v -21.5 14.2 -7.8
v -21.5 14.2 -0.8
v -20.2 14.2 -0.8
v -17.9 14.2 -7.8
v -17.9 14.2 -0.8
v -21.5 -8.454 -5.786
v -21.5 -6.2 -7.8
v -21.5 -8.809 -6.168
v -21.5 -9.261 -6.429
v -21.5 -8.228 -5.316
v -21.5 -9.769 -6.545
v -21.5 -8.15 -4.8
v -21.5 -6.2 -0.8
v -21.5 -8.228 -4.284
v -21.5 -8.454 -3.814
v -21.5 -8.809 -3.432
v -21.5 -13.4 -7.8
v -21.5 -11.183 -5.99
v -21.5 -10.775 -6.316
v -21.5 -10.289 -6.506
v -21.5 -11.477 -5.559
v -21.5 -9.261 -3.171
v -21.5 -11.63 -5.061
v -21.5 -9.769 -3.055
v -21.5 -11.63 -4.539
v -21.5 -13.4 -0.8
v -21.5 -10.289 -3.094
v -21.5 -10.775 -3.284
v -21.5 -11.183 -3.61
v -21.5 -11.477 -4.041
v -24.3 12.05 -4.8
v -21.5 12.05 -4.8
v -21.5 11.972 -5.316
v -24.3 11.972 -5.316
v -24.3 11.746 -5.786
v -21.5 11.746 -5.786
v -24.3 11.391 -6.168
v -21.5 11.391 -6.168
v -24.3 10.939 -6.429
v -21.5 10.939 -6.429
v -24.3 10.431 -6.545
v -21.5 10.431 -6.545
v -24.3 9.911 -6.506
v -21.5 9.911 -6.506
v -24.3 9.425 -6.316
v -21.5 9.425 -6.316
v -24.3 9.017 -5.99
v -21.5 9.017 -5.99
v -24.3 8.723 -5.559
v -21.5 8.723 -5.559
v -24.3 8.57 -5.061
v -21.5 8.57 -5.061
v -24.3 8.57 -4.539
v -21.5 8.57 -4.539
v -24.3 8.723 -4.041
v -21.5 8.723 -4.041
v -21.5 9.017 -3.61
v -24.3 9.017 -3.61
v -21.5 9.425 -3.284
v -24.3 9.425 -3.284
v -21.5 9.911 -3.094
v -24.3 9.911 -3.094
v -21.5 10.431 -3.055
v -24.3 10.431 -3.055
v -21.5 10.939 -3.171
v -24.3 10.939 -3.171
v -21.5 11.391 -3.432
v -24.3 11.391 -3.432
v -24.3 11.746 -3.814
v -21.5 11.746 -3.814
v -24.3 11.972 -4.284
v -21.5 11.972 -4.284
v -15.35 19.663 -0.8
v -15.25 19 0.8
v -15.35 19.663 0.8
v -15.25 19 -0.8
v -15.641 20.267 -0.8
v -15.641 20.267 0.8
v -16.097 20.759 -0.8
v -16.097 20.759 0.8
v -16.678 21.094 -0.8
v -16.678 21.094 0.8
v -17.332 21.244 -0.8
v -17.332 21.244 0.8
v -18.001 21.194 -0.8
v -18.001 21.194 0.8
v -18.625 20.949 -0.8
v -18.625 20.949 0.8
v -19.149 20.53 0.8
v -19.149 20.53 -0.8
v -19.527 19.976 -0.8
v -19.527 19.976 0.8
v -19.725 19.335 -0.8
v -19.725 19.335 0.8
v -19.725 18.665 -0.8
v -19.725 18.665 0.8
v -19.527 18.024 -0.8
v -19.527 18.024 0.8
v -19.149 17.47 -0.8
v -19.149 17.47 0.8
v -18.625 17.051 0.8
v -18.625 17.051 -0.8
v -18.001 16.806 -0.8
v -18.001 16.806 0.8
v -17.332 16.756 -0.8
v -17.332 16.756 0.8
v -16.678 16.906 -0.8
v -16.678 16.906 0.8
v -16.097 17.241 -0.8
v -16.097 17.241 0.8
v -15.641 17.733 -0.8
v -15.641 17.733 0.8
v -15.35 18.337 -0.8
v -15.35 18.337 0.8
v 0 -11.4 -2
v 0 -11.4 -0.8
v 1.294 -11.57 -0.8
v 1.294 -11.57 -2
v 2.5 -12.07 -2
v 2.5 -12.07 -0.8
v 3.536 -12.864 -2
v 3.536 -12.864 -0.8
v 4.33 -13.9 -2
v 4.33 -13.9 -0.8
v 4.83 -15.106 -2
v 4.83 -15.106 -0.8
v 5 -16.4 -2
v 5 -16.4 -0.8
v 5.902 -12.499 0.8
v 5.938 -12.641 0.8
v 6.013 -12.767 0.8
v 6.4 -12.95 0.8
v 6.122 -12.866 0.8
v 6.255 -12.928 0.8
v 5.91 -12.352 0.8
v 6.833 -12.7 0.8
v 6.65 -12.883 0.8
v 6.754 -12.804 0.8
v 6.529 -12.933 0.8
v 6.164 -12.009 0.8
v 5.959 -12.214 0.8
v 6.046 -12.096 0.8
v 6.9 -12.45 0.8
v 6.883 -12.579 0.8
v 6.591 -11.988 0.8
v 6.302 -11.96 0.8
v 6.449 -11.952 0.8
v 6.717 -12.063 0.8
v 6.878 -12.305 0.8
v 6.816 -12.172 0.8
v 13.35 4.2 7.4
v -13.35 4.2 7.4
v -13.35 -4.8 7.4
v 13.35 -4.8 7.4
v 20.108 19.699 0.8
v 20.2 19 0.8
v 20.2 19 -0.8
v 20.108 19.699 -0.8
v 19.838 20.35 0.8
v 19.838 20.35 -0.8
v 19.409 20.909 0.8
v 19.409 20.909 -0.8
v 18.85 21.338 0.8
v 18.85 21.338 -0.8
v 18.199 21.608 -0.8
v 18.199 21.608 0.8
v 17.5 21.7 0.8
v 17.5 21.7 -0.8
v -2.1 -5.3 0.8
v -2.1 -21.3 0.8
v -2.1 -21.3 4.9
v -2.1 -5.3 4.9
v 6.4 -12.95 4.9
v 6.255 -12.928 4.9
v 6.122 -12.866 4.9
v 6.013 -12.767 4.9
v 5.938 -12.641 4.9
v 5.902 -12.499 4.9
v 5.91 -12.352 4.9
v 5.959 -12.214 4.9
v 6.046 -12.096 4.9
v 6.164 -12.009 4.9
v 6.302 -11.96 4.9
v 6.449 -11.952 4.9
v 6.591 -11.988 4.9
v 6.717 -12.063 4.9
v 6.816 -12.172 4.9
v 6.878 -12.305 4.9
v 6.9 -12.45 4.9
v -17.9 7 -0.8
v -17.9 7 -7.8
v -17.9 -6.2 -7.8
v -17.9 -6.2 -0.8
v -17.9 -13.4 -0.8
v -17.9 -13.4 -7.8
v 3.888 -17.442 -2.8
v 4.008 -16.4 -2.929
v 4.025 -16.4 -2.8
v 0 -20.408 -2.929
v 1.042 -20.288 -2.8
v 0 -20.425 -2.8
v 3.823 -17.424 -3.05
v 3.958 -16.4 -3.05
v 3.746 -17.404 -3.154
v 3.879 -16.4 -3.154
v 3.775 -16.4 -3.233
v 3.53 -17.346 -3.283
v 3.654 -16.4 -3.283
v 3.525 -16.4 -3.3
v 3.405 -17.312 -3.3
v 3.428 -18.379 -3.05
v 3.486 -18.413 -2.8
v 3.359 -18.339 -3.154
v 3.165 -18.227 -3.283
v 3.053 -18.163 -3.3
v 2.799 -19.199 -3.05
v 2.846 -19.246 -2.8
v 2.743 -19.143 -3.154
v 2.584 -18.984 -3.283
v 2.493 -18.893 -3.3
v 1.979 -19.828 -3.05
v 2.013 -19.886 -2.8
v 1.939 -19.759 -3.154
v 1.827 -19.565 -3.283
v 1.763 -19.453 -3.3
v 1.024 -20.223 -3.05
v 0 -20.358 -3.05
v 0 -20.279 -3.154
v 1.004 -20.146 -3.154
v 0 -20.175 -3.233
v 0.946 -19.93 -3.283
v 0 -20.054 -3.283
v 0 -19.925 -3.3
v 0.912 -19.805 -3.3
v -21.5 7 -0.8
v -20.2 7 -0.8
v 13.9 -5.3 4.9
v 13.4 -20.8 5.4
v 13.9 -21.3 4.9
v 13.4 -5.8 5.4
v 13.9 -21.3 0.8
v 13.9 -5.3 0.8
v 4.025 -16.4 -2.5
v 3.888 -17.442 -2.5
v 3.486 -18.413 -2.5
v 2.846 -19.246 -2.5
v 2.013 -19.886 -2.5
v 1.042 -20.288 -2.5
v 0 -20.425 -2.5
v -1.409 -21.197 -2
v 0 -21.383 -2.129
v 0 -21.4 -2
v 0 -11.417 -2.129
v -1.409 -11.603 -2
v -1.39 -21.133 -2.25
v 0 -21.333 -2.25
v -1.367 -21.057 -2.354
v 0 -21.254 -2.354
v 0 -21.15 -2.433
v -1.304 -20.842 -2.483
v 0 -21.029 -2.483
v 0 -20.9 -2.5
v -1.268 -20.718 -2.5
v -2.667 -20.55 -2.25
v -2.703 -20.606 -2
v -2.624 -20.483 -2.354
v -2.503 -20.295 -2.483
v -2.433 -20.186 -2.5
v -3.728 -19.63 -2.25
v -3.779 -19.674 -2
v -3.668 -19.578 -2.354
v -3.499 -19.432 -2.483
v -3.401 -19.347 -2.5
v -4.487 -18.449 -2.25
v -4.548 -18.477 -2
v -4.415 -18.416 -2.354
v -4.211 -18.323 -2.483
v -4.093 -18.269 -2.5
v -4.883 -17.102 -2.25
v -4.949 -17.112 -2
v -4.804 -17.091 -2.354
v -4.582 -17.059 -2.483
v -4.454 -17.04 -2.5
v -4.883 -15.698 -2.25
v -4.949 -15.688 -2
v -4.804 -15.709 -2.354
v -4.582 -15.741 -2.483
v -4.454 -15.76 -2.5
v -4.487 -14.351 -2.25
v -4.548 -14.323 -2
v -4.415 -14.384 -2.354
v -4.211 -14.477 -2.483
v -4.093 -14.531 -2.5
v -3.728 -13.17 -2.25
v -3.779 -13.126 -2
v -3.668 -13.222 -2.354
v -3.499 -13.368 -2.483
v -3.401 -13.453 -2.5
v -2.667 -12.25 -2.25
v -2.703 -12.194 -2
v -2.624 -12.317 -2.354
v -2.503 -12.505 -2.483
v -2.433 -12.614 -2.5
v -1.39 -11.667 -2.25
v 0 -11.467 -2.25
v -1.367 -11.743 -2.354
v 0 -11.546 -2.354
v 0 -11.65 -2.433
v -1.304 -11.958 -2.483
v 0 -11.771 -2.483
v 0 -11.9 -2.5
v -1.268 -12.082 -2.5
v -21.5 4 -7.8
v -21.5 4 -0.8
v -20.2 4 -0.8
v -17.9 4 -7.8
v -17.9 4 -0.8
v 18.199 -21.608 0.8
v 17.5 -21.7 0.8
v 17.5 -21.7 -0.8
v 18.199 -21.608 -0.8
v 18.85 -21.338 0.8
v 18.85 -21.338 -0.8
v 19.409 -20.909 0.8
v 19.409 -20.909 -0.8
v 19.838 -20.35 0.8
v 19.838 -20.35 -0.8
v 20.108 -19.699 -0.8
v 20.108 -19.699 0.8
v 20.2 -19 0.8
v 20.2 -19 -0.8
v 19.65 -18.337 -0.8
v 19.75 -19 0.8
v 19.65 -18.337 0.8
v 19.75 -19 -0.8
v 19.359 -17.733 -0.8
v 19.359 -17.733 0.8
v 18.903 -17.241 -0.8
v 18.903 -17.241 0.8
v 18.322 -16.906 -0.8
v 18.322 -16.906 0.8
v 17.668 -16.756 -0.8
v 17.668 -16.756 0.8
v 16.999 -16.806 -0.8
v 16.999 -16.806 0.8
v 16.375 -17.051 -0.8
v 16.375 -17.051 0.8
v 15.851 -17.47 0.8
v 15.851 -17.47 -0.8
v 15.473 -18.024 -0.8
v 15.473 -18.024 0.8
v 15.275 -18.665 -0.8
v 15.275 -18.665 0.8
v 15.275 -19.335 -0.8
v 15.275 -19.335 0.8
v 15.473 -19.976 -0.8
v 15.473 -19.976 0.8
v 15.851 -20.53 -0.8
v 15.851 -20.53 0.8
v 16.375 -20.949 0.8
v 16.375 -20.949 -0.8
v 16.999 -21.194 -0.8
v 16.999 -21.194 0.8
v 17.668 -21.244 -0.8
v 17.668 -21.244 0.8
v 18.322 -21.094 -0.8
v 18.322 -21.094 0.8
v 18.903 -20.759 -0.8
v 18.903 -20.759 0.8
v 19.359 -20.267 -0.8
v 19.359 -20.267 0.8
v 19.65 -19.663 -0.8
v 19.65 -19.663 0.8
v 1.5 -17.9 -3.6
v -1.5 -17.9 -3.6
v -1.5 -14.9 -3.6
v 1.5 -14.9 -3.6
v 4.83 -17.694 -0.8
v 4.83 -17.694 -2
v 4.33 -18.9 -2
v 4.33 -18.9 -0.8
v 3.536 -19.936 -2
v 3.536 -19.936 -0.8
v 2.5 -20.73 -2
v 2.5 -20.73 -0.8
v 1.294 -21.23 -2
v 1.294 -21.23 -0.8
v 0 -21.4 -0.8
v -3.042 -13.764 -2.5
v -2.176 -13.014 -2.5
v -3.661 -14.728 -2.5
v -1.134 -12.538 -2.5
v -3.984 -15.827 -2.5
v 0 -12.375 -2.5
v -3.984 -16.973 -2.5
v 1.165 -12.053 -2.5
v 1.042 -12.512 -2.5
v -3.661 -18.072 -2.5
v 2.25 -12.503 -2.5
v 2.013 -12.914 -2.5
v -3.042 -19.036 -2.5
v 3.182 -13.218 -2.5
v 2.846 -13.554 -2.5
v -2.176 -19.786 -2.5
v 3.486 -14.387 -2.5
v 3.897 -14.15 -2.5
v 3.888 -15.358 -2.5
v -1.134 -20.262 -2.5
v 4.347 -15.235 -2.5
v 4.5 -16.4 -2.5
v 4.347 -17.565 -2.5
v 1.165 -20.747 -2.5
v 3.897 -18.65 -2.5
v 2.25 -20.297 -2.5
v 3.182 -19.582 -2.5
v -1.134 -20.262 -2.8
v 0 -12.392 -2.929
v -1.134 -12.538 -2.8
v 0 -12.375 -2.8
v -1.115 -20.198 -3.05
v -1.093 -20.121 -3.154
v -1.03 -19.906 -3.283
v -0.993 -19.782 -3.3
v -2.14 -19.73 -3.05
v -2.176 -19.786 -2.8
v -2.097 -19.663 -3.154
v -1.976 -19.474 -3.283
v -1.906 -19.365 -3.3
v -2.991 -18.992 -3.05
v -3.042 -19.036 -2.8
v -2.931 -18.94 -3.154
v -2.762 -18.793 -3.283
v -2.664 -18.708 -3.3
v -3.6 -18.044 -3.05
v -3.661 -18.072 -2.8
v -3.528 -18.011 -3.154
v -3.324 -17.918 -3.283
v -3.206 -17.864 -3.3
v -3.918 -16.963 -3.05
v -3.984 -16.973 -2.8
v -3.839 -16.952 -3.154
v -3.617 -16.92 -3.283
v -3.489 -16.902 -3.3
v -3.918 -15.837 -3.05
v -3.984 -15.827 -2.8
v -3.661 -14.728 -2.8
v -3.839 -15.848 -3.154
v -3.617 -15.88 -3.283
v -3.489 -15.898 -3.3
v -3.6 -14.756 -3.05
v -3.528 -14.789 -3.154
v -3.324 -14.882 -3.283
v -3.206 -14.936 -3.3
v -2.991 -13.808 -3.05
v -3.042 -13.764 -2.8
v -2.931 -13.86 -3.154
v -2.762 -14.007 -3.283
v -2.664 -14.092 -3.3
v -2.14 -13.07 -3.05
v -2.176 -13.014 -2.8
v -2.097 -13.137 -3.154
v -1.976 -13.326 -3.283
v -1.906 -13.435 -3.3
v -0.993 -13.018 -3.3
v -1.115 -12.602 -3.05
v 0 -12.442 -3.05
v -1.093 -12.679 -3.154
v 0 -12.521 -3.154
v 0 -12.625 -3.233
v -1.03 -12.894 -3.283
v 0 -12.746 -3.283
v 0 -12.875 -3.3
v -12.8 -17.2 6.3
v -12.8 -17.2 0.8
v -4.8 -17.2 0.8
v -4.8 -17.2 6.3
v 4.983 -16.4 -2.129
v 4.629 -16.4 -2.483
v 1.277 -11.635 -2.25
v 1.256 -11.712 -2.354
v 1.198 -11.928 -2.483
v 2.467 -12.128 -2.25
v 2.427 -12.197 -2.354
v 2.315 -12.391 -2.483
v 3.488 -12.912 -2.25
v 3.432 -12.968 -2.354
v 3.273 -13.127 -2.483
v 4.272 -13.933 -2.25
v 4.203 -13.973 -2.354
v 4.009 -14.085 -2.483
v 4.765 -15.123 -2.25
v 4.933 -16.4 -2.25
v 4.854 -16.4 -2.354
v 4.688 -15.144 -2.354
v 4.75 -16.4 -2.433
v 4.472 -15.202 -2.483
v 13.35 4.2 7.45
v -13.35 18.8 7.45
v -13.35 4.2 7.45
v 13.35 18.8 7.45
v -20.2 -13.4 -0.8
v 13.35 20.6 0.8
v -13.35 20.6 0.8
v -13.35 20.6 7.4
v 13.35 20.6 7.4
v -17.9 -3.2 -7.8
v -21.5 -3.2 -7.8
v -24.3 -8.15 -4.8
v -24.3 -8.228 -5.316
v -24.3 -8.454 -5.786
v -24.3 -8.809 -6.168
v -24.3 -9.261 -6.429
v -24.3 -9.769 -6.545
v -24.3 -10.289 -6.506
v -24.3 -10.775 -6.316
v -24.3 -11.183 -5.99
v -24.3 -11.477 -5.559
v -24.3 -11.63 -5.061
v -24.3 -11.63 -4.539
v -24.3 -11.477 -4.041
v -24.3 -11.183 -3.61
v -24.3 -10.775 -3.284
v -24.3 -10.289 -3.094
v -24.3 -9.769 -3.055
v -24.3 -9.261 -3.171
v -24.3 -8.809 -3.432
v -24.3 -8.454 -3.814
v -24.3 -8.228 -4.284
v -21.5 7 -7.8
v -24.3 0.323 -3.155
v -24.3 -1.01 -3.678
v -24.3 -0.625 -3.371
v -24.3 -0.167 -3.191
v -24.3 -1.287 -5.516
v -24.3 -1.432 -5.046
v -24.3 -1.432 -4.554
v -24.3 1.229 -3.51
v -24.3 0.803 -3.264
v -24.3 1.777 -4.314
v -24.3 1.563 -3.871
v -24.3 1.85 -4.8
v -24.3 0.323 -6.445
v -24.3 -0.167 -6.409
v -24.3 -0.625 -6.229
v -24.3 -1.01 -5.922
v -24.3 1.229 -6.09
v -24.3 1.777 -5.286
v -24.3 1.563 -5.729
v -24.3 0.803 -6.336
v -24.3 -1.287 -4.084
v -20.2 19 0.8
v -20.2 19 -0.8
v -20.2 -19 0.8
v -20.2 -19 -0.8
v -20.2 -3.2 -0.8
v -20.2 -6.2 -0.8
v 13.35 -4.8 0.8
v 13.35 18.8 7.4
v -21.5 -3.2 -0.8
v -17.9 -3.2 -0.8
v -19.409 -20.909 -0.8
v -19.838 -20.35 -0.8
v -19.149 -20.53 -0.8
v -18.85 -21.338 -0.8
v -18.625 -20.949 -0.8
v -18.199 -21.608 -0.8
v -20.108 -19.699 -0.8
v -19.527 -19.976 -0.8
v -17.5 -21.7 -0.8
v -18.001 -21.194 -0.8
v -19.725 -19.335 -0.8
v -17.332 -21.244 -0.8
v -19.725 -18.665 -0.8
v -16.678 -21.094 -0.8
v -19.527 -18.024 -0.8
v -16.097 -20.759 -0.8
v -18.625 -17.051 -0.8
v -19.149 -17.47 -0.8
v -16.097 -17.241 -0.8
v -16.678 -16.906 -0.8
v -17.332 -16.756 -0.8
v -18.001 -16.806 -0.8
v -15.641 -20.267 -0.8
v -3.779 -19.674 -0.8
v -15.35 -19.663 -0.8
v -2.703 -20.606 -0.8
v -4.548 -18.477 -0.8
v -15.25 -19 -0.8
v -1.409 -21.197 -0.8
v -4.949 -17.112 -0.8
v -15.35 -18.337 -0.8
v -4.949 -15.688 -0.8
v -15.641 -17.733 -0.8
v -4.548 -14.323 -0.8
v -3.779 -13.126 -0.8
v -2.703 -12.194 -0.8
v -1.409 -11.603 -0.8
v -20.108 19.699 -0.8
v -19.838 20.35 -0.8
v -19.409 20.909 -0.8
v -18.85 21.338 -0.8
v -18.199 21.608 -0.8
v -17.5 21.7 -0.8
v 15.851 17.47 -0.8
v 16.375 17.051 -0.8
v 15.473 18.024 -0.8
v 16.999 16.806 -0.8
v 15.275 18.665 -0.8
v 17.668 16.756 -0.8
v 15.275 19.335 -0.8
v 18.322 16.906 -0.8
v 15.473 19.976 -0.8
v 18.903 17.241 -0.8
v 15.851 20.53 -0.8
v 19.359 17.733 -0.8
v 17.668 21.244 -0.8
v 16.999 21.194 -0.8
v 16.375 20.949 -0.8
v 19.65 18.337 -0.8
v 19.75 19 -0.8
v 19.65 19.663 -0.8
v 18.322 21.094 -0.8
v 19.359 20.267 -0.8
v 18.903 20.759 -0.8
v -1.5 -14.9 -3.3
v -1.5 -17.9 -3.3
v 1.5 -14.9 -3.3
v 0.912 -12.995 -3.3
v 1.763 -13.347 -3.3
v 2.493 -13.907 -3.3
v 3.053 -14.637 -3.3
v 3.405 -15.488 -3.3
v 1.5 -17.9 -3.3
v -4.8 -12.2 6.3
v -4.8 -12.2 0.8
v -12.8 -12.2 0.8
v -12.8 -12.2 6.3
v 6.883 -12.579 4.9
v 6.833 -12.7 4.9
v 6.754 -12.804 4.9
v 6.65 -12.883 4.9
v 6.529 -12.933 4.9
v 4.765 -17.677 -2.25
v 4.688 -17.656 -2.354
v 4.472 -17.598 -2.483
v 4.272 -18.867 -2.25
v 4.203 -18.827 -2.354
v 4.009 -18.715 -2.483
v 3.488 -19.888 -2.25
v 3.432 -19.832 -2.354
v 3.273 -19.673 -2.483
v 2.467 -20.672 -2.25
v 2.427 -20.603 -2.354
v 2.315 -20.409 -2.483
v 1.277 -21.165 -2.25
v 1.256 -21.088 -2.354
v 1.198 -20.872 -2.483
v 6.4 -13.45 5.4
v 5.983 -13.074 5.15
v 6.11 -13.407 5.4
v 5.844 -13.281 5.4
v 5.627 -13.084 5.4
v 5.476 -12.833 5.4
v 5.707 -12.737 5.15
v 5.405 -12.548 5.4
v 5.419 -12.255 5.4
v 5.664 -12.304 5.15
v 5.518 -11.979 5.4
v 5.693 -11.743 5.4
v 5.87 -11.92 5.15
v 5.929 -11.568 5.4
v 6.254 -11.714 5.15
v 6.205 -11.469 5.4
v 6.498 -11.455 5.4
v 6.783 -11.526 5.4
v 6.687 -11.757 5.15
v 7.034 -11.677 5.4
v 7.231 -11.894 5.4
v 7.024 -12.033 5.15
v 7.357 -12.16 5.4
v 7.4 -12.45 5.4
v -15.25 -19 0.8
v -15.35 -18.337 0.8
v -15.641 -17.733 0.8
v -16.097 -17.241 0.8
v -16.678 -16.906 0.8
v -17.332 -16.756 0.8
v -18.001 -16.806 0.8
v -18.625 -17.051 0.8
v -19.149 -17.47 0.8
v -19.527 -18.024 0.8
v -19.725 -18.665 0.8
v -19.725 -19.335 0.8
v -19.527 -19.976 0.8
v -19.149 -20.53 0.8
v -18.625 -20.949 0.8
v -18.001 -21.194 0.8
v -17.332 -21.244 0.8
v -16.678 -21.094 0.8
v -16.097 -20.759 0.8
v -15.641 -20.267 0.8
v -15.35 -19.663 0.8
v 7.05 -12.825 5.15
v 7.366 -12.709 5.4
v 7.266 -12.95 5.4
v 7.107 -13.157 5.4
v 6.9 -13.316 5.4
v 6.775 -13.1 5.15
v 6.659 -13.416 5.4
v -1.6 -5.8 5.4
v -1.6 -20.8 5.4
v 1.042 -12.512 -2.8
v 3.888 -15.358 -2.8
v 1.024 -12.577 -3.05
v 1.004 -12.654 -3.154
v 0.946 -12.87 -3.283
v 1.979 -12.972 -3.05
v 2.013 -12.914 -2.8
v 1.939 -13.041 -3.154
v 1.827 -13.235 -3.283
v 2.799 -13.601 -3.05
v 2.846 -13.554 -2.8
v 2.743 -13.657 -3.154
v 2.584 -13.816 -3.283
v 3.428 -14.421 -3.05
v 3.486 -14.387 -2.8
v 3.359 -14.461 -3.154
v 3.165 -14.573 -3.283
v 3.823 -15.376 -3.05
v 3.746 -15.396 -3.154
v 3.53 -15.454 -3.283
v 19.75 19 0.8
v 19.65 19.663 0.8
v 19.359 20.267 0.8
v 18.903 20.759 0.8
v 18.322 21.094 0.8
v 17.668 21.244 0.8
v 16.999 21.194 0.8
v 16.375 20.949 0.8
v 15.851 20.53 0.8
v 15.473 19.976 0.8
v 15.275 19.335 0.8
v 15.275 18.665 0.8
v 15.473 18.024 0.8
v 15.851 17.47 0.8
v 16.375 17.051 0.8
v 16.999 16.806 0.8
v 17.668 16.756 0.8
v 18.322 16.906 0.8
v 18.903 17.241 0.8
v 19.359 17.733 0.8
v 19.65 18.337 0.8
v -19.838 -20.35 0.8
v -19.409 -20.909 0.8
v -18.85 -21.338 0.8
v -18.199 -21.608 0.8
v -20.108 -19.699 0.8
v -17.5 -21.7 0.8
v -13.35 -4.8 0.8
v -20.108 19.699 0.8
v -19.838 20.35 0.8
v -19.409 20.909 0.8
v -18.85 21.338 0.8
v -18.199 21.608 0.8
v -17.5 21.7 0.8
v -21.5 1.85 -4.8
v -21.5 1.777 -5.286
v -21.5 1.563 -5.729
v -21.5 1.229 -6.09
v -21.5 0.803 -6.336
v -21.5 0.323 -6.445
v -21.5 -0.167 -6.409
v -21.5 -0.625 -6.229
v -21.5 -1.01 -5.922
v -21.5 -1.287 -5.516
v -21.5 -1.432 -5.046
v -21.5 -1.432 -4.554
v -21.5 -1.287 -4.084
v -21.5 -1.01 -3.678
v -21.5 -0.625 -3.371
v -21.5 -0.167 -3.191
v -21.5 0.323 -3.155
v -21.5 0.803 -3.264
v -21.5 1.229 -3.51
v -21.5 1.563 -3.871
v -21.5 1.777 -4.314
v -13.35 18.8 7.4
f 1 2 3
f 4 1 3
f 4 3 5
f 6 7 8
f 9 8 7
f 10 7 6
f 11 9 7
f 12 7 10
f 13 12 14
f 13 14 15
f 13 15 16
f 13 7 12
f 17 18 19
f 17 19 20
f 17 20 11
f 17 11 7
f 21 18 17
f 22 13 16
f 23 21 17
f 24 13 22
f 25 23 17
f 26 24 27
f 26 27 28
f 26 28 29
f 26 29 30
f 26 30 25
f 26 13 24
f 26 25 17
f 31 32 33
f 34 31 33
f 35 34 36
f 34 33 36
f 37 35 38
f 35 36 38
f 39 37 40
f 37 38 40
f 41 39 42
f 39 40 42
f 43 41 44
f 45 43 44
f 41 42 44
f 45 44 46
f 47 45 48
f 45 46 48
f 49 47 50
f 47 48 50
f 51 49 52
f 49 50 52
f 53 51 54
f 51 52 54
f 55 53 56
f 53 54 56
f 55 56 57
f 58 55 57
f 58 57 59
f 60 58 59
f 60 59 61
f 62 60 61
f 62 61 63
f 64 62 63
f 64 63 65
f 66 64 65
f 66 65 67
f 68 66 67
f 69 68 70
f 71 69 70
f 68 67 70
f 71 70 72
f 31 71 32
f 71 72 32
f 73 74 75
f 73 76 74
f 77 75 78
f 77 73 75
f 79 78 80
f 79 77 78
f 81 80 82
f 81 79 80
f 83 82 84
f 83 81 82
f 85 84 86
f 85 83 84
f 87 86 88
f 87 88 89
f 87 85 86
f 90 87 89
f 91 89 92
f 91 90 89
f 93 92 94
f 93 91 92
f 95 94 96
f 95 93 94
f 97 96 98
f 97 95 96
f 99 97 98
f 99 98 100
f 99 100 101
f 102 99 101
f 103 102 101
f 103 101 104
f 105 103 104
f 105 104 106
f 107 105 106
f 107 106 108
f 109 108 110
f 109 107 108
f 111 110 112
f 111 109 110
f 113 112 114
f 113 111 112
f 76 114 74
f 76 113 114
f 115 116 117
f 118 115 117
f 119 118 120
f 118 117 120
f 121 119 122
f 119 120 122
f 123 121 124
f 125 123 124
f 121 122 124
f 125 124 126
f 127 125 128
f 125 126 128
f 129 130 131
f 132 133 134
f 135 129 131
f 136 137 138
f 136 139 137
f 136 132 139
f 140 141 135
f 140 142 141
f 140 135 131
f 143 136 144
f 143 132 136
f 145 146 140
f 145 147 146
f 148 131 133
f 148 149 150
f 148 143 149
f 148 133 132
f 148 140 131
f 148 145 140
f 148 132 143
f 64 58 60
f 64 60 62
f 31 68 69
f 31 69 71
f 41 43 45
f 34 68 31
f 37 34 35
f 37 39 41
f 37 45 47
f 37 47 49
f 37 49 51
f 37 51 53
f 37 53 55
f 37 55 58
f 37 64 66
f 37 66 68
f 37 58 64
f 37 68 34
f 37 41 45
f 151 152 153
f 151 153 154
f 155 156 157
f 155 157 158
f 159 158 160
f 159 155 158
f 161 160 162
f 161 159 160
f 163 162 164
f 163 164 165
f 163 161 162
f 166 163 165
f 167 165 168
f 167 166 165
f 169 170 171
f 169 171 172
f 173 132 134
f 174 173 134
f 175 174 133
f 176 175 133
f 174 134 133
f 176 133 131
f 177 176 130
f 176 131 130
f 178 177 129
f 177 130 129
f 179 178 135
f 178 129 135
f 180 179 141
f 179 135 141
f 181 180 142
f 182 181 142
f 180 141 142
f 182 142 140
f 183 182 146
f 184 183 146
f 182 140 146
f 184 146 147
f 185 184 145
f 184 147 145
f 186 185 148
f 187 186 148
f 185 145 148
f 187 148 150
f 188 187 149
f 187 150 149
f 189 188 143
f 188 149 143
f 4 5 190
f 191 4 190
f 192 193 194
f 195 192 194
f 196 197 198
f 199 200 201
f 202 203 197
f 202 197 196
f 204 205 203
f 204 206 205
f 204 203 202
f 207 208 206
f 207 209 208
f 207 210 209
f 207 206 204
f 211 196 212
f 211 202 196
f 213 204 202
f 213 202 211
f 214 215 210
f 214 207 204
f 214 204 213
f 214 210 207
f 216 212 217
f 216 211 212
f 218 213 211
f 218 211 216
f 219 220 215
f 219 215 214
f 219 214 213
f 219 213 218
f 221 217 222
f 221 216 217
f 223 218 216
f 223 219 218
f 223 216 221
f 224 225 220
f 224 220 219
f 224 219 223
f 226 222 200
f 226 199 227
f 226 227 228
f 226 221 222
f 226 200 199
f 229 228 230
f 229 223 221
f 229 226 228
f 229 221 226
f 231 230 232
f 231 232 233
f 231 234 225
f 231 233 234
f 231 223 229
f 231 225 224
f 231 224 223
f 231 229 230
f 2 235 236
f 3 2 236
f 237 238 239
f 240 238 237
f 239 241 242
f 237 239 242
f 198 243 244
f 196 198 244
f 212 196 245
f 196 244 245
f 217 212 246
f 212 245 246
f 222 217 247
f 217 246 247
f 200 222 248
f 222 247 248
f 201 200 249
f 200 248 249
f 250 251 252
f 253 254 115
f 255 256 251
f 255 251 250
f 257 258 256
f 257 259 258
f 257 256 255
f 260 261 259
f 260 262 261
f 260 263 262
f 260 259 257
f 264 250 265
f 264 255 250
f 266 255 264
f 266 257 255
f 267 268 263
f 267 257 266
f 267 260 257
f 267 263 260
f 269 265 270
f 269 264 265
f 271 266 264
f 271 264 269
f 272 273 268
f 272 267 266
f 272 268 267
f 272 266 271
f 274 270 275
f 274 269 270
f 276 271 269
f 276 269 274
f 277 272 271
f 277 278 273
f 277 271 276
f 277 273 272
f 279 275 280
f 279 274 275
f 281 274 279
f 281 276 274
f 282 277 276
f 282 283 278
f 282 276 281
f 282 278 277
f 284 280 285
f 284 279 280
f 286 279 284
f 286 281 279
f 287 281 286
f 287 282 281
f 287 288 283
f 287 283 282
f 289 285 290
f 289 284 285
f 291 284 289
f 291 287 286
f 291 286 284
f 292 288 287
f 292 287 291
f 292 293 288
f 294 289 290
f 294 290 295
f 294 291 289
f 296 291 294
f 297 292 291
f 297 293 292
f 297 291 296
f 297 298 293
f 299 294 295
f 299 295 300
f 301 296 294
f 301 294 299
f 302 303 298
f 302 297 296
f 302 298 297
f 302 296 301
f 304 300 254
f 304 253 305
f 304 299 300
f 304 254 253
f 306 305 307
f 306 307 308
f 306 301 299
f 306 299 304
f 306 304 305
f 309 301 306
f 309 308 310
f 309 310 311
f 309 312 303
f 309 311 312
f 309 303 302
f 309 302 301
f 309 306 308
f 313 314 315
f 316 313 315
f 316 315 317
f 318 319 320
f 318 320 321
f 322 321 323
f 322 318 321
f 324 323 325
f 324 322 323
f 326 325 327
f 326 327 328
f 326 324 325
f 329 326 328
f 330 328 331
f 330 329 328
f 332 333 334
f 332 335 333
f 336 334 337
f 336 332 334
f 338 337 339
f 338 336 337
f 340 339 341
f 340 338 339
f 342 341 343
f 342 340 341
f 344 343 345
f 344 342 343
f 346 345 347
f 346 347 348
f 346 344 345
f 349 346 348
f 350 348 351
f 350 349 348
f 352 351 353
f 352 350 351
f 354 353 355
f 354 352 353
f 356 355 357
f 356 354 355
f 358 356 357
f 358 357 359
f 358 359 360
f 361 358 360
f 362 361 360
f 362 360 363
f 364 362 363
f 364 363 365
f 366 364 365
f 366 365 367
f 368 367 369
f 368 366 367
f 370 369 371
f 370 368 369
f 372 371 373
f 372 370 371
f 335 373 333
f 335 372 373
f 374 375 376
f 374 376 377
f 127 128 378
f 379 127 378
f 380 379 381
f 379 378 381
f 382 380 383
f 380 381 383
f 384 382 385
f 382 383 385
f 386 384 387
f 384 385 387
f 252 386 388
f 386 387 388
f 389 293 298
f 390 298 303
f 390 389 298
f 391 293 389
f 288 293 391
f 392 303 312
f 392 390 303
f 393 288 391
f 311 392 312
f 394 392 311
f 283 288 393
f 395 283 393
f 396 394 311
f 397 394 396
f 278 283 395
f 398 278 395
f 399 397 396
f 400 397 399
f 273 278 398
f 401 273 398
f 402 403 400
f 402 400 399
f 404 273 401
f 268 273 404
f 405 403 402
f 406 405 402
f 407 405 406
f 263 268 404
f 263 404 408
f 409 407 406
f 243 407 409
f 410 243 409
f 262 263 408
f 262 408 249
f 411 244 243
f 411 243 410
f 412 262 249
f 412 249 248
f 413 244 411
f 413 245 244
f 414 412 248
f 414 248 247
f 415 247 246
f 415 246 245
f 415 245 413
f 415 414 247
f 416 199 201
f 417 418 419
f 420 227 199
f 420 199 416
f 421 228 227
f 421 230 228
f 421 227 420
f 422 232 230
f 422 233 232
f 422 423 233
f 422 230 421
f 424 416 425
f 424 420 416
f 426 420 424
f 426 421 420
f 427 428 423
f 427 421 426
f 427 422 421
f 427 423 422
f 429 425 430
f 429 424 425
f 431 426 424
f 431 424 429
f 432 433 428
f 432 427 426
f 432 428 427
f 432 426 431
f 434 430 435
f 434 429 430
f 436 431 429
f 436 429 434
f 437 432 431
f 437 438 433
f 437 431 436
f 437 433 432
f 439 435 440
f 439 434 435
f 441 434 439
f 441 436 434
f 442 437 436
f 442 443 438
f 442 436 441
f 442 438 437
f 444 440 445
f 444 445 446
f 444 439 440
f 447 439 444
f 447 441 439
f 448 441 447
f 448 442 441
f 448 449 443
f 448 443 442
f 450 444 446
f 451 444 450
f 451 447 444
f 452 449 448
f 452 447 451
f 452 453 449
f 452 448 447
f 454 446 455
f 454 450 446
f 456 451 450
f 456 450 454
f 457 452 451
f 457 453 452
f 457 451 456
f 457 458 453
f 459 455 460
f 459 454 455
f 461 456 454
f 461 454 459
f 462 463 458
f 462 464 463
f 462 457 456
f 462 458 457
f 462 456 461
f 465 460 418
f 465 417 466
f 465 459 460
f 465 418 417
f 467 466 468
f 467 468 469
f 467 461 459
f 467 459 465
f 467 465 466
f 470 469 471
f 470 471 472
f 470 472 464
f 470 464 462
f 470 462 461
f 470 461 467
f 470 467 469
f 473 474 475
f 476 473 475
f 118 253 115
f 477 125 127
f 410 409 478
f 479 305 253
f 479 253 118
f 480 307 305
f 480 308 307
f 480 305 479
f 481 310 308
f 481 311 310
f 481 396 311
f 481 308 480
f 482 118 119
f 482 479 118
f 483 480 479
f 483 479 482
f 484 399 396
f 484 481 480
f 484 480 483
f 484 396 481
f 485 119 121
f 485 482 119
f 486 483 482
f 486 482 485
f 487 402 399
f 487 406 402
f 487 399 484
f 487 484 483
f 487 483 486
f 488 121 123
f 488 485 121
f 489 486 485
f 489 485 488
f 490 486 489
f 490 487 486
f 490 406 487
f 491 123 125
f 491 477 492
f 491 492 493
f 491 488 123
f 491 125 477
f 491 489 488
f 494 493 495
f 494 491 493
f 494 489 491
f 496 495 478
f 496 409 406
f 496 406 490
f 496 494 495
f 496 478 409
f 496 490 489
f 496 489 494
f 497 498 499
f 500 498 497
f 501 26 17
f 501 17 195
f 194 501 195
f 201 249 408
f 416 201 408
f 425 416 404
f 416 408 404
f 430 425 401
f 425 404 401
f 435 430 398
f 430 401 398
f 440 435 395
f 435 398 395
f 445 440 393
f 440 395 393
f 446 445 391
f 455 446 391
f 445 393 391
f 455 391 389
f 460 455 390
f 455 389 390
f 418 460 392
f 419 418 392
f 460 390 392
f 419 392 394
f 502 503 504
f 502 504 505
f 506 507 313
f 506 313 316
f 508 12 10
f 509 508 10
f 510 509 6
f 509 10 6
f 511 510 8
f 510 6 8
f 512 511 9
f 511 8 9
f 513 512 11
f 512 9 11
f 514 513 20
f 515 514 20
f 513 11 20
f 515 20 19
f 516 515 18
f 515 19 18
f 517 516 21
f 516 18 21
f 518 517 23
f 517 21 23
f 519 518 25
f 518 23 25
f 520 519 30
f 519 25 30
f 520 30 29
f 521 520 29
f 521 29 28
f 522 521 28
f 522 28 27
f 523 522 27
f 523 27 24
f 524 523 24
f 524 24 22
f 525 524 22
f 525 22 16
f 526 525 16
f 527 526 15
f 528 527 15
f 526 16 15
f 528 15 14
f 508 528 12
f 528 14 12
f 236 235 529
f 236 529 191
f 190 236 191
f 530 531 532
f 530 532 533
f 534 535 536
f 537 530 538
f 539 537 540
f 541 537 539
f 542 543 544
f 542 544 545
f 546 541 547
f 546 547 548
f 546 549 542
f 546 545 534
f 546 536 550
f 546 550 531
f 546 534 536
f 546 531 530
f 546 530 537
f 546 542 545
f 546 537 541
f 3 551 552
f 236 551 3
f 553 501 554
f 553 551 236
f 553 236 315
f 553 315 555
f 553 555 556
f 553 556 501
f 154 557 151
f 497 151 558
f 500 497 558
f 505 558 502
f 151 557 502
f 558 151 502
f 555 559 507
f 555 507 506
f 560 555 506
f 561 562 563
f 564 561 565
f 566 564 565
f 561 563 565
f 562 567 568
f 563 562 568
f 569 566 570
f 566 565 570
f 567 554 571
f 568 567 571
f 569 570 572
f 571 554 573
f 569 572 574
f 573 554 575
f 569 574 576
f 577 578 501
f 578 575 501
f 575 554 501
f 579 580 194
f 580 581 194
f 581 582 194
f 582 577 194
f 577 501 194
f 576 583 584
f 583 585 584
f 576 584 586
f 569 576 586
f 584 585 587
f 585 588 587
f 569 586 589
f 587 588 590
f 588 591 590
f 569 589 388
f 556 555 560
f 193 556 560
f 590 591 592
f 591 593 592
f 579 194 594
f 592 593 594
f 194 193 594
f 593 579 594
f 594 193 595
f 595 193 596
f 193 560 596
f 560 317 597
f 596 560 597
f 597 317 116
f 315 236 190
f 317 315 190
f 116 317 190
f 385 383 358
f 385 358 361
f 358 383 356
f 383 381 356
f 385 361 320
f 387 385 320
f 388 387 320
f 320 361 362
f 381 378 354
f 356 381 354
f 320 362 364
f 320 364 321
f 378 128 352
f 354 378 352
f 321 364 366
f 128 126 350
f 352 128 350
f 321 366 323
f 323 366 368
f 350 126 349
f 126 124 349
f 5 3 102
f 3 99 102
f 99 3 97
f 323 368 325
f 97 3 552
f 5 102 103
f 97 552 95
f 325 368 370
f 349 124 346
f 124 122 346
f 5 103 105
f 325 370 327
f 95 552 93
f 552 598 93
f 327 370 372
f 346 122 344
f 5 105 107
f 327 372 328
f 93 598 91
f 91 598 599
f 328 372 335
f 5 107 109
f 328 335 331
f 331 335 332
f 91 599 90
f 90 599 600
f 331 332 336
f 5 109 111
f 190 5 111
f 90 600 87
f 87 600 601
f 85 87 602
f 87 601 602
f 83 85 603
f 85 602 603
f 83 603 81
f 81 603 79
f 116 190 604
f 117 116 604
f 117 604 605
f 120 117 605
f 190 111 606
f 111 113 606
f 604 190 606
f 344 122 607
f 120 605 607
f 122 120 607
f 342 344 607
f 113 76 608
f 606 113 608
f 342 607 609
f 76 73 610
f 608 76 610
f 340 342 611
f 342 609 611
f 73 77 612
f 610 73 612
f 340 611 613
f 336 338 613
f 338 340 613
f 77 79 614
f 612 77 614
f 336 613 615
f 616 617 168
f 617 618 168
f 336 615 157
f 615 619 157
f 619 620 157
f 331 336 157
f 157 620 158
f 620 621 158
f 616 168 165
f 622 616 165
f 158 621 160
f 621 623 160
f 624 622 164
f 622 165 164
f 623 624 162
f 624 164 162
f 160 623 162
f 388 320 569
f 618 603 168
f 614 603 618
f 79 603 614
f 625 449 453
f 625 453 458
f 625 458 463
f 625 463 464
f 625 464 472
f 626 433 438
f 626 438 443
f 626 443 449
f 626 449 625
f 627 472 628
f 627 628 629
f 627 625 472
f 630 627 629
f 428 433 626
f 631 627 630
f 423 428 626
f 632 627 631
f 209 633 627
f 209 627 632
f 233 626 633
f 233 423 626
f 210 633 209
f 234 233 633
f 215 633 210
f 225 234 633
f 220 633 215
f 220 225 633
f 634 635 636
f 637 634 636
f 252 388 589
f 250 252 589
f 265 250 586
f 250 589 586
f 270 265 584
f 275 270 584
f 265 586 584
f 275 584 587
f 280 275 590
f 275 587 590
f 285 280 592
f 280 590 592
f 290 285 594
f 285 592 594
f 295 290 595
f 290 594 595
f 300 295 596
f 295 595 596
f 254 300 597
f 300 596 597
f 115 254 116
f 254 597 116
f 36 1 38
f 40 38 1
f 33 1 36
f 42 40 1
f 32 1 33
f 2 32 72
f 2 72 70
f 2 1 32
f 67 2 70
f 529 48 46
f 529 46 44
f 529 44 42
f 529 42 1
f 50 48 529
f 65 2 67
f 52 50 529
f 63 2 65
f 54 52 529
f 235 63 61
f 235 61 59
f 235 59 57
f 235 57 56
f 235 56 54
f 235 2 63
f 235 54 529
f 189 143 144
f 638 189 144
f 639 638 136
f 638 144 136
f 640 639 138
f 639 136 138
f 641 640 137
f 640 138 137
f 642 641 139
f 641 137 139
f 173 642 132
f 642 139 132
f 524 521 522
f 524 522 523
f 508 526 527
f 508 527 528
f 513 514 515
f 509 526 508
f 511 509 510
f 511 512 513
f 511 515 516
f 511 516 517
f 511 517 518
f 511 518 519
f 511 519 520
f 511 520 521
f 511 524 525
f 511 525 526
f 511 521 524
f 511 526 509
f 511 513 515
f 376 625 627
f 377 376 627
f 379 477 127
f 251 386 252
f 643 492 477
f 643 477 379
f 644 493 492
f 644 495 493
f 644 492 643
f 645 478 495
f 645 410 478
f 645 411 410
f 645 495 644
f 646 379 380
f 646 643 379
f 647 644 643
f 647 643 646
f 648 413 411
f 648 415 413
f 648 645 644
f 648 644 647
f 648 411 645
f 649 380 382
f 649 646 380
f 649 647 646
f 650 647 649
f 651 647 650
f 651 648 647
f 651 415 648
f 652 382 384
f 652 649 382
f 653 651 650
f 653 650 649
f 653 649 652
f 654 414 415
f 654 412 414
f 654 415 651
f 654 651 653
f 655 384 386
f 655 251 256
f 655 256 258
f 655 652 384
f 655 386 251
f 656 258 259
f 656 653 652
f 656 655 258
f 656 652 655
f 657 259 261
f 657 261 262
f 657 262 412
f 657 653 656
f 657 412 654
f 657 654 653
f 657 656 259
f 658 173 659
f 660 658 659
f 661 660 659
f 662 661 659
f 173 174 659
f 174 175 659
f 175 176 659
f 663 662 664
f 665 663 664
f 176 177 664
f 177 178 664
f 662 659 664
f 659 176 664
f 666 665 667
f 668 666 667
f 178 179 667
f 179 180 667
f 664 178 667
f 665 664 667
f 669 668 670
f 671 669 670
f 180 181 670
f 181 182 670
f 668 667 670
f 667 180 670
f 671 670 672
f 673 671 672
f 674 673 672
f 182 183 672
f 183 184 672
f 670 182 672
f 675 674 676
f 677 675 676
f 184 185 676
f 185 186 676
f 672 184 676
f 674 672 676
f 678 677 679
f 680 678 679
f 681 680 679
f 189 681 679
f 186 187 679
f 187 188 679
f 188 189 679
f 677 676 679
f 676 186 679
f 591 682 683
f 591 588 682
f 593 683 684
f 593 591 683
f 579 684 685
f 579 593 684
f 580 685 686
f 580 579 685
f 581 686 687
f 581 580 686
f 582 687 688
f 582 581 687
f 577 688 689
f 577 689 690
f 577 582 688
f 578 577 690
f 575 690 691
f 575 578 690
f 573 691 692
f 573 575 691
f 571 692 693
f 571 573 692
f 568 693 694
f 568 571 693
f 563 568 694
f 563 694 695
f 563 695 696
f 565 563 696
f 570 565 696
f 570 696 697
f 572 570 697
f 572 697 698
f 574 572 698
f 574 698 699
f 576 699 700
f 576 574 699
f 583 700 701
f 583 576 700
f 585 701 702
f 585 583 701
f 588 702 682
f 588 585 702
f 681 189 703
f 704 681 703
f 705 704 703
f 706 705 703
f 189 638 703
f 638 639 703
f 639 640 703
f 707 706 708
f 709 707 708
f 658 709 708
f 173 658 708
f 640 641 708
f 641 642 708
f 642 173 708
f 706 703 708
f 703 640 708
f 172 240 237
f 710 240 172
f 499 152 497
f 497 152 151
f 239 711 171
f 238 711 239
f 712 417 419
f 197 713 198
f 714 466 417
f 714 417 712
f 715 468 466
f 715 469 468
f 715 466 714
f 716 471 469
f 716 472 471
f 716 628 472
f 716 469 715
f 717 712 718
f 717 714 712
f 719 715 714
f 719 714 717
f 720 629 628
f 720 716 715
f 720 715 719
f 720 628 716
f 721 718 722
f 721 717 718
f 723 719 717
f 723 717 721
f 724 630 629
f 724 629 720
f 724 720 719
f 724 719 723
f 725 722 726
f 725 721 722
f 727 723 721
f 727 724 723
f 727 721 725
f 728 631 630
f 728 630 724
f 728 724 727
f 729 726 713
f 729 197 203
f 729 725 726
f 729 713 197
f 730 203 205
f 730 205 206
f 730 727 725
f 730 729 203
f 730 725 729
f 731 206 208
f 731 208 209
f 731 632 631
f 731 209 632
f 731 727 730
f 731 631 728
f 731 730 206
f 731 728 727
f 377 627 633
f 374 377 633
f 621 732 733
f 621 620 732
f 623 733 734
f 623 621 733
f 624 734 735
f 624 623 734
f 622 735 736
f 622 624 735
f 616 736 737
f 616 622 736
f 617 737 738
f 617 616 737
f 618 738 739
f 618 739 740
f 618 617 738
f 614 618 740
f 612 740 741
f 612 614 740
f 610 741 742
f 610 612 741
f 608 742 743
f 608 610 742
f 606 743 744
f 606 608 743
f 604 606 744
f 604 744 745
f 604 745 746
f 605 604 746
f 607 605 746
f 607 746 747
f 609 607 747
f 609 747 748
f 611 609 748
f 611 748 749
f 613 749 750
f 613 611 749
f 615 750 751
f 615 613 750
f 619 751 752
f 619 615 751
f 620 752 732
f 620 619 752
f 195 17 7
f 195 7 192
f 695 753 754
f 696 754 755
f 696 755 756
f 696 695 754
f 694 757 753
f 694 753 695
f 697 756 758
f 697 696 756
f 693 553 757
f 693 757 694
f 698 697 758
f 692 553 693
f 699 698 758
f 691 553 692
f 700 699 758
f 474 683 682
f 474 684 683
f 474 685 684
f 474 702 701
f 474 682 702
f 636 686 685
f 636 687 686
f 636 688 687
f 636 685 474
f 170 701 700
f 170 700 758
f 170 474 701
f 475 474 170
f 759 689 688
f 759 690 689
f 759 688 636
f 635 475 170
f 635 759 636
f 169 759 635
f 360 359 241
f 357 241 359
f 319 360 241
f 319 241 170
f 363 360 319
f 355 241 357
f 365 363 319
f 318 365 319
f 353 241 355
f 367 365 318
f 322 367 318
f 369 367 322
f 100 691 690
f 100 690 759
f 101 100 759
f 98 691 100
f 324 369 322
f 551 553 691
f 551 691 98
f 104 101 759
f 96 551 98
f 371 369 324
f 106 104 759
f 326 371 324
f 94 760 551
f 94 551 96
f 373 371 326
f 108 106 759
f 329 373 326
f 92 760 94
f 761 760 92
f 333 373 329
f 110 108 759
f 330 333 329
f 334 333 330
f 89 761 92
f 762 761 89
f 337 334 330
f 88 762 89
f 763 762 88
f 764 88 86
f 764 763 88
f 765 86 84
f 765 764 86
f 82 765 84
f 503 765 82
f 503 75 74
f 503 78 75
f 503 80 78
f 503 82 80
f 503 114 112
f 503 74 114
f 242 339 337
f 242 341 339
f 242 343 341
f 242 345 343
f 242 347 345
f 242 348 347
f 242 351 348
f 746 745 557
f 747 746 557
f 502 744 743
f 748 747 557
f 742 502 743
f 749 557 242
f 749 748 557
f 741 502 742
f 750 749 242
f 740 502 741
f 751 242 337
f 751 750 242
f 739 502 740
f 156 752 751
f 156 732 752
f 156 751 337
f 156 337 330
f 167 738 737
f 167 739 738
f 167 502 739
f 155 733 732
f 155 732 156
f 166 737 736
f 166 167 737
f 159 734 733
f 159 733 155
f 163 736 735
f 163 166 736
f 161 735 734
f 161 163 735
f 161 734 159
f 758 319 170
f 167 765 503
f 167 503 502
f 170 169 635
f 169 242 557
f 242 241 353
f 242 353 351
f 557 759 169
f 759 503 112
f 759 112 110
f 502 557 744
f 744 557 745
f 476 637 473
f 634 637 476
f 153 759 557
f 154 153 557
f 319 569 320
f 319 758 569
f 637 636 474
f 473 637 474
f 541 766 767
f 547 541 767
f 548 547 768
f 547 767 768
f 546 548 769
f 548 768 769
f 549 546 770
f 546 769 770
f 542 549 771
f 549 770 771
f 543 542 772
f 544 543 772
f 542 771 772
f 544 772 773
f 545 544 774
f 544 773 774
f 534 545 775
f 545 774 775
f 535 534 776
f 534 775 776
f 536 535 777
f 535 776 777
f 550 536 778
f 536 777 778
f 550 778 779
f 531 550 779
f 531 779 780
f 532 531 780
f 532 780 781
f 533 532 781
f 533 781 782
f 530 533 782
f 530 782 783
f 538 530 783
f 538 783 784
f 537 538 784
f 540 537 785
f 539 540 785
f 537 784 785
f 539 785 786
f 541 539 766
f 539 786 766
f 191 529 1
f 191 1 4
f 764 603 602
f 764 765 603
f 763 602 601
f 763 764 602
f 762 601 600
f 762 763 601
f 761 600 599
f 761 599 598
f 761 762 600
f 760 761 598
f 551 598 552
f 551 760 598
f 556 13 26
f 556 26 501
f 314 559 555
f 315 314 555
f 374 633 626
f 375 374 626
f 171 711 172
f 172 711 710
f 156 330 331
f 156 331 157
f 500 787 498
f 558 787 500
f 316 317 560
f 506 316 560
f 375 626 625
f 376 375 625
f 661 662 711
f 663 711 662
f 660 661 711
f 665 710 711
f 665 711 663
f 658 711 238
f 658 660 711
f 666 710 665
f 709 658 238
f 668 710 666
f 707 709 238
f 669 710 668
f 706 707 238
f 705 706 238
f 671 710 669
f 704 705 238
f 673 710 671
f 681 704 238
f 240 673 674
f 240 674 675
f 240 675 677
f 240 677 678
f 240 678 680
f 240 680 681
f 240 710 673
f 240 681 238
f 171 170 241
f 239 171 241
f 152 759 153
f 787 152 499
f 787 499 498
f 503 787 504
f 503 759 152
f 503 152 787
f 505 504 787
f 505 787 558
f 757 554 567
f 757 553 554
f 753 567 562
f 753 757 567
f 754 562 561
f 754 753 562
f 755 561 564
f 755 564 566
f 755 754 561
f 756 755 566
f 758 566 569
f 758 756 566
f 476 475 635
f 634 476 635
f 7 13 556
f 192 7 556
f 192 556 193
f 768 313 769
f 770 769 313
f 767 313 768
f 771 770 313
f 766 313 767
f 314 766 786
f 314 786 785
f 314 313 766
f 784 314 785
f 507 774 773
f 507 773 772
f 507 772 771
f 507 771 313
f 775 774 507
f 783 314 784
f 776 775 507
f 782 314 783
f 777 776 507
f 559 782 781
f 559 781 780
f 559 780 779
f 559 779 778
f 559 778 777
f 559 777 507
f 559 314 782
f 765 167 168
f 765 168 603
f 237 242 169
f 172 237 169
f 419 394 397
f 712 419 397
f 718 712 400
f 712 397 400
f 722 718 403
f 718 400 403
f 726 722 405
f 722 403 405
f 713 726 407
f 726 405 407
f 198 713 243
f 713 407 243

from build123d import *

# Parameters (mm, degrees)
F0_R      = 2.25
F1_DEPTH  = 0.8
F3_W      = 2.1
F3_H      = 16
F4_DEPTH  = 4.6
F5_DEPTH  = 5.5
F3_W_2    = 26.7
F3_H_2    = 1.8
F6_DEPTH  = 6.6
F3_H_3    = 14.6
F7_DEPTH  = 6.65
F9_W      = 3.6
F9_H      = 7.2
F10_DEPTH = 7
F12_W     = 3.3
F12_H     = 1.75
F12_H_2   = 1.65
F16_DEPTH = 2.5
F17_DEPTH = 1.7
F18_R     = 0.5
F19_SIZE  = 0.5
F20_DEPTH = 2.8


with BuildPart() as f1:
    # F0 (on Top) → F1 (new body, symmetric)
    with BuildSketch(Plane.XY):
        with BuildLine():
            Line((-17.5, -21.7), (17.5, -21.7))
            ThreePointArc((17.5, -21.7), (19.4091883092, -20.9091883092), (20.2, -19))
            Line((20.2, -19), (20.2, 19))
            ThreePointArc((20.2, 19), (19.4091883092, 20.9091883092), (17.5, 21.7))
            Line((17.5, 21.7), (-17.5, 21.7))
            ThreePointArc((-17.5, 21.7), (-19.4091883092, 20.9091883092), (-20.2, 19))
            Line((-20.2, 19), (-20.2, -19))
            ThreePointArc((-20.2, -19), (-19.4091883092, -20.9091883092), (-17.5, -21.7))
        make_face()
        with Locations((-17.5, -19)):
            Circle(F0_R, mode=Mode.SUBTRACT)
        with Locations((17.5, -19)):
            Circle(F0_R, mode=Mode.SUBTRACT)
        with Locations((-17.5, 19)):
            Circle(F0_R, mode=Mode.SUBTRACT)
        with Locations((17.5, 19)):
            Circle(F0_R, mode=Mode.SUBTRACT)
    extrude(amount=F1_DEPTH, both=True)

    # F3 (on offset) → F4 (join)
    with BuildSketch(Plane.XY.offset(0.8)):
        with Locations((-1.05, -13.3)):
            Rectangle(F3_W, F3_H)
        Polygon((0, -5.3), (0, -21.3), (5.9, -21.3), (13.9, -21.3), (13.9, -5.3), align=None)
        with BuildLine():
            ThreePointArc((6.9, -12.45), (6.7535533906, -12.8035533906), (6.4, -12.95))
            ThreePointArc((6.4, -12.95), (6.0464466094, -12.0964466094), (6.9, -12.45))
        make_face(mode=Mode.SUBTRACT)
    extrude(amount=F4_DEPTH)

    # F3 (on offset) → F5 (join)
    with BuildSketch(Plane.XY.offset(0.8)):
        Polygon((-8.8, -17.2), (-4.8, -17.2), (-4.8, -12.2), (-12.8, -12.2), (-12.8, -17.2), align=None)
    extrude(amount=F5_DEPTH)

    # F3 (on offset) → F6 (join)
    with BuildSketch(Plane.XY.offset(0.8)):
        with Locations((0, 19.7)):
            Rectangle(F3_W_2, F3_H_2)
        Polygon((-13.35, 4.2), (-13.35, -4.8), (0, -4.8), (13.35, -4.8), (13.35, 4.2), align=None)
    extrude(amount=F6_DEPTH)

    # F3 (on offset) → F7 (join)
    with BuildSketch(Plane.XY.offset(0.8)):
        with Locations((0, 11.5)):
            Rectangle(F3_W_2, F3_H_3)
    extrude(amount=F7_DEPTH)

    # F9 (on offset) → F10 (join)
    with BuildSketch(Plane(origin=(0, 0, -0.8), x_dir=(1, 0, 0), z_dir=(0, 0, -1))):
        with Locations((-19.7, -10.6)):
            Rectangle(F9_W, F9_H)
        with Locations((-19.7, -0.4)):
            Rectangle(F9_W, F9_H)
        with Locations((-19.7, 9.8)):
            Rectangle(F9_W, F9_H)
    extrude(amount=F10_DEPTH)

    # F12 (on offset) → F13 (revolve)
    with BuildSketch(Plane(origin=(0, 0, -4.8), x_dir=(1, 0, 0), z_dir=(0, 0, -1))):
        with Locations((-22.65, 9.025)):
            Rectangle(F12_W, F12_H)
    revolve(axis=Axis((-22.65, -9.9, -4.8), (-1, 0, 0)))

    # F12 (on offset) → F14 (revolve)
    with BuildSketch(Plane(origin=(0, 0, -4.8), x_dir=(1, 0, 0), z_dir=(0, 0, -1))):
        with Locations((-22.65, -1.025)):
            Rectangle(F12_W, F12_H_2)
    revolve(axis=Axis((-22.65, 0.2, -4.8), (-1, 0, 0)))

    # F12 (on offset) → F15 (revolve)
    with BuildSketch(Plane(origin=(0, 0, -4.8), x_dir=(1, 0, 0), z_dir=(0, 0, -1))):
        with Locations((-22.65, -11.175)):
            Rectangle(F12_W, F12_H)
    revolve(axis=Axis((-22.65, 10.3, -4.8), (-1, 0, 0)))

    # F9 (on offset) → F16 (join)
    with BuildSketch(Plane(origin=(0, 0, -0.8), x_dir=(1, 0, 0), z_dir=(0, 0, -1))):
        with BuildLine():
            Line((0, 14.9), (0, 12.375))
            ThreePointArc((0, 12.375), (2.8461047943, 13.5538952057), (4.025, 16.4))
            ThreePointArc((4.025, 16.4), (2.8461047943, 19.2461047943), (0, 20.425))
            Line((0, 20.425), (0, 17.9))
            Line((0, 17.9), (1.5, 17.9))
            Line((1.5, 17.9), (1.5, 14.9))
            Line((1.5, 14.9), (0, 14.9))
        make_face()
        with BuildLine():
            ThreePointArc((0, 20.425), (-4.025, 16.4), (0, 12.375))
            Line((0, 12.375), (0, 14.9))
            Line((0, 14.9), (-1.5, 14.9))
            Line((-1.5, 14.9), (-1.5, 17.9))
            Line((-1.5, 17.9), (0, 17.9))
            Line((0, 17.9), (0, 20.425))
        make_face()
    extrude(amount=F16_DEPTH)

    # F9 (on offset) → F17 (join)
    with BuildSketch(Plane(origin=(0, 0, -0.8), x_dir=(1, 0, 0), z_dir=(0, 0, -1))):
        with BuildLine():
            Line((0, 12.375), (0, 11.4))
            ThreePointArc((0, 11.4), (3.5355339059, 12.8644660941), (5, 16.4))
            ThreePointArc((5, 16.4), (3.5355339059, 19.9355339059), (0, 21.4))
            Line((0, 21.4), (0, 20.425))
            ThreePointArc((0, 20.425), (2.8461047943, 19.2461047943), (4.025, 16.4))
            ThreePointArc((4.025, 16.4), (2.8461047943, 13.5538952057), (0, 12.375))
        make_face()
        with BuildLine():
            ThreePointArc((0, 21.4), (-5, 16.4), (0, 11.4))
            Line((0, 11.4), (0, 12.375))
            ThreePointArc((0, 12.375), (-4.025, 16.4), (0, 20.425))
            Line((0, 20.425), (0, 21.4))
        make_face()
    extrude(amount=F17_DEPTH)

    # F18
    f18_edges = [f1.edges().sort_by_distance(p)[0] for p in [
        (-5, -16.4, -2.5),
        (-4.025, -16.4, -3.3),
    ]]
    fillet(f18_edges, radius=F18_R)

    # F19
    f19_edges = [f1.edges().sort_by_distance(p)[0] for p in [
        (5.9, -21.3, 5.4),
        (13.9, -13.3, 5.4),
        (5.9, -5.3, 5.4),
        (-2.1, -13.3, 5.4),
        (5.9, -12.45, 5.4),
    ]]
    chamfer(f19_edges, length=F19_SIZE)

    # F9 (on offset) → F20 (join)
    with BuildSketch(Plane(origin=(0, 0, -0.8), x_dir=(1, 0, 0), z_dir=(0, 0, -1))):
        Polygon((0, 16.4), (0, 14.9), (1.5, 14.9), (1.5, 17.9), (0, 17.9), align=None)
        Polygon((-1.5, 14.9), (0, 14.9), (0, 16.4), (0, 17.9), (-1.5, 17.9), align=None)
    extrude(amount=F20_DEPTH)


solid = f1.part
